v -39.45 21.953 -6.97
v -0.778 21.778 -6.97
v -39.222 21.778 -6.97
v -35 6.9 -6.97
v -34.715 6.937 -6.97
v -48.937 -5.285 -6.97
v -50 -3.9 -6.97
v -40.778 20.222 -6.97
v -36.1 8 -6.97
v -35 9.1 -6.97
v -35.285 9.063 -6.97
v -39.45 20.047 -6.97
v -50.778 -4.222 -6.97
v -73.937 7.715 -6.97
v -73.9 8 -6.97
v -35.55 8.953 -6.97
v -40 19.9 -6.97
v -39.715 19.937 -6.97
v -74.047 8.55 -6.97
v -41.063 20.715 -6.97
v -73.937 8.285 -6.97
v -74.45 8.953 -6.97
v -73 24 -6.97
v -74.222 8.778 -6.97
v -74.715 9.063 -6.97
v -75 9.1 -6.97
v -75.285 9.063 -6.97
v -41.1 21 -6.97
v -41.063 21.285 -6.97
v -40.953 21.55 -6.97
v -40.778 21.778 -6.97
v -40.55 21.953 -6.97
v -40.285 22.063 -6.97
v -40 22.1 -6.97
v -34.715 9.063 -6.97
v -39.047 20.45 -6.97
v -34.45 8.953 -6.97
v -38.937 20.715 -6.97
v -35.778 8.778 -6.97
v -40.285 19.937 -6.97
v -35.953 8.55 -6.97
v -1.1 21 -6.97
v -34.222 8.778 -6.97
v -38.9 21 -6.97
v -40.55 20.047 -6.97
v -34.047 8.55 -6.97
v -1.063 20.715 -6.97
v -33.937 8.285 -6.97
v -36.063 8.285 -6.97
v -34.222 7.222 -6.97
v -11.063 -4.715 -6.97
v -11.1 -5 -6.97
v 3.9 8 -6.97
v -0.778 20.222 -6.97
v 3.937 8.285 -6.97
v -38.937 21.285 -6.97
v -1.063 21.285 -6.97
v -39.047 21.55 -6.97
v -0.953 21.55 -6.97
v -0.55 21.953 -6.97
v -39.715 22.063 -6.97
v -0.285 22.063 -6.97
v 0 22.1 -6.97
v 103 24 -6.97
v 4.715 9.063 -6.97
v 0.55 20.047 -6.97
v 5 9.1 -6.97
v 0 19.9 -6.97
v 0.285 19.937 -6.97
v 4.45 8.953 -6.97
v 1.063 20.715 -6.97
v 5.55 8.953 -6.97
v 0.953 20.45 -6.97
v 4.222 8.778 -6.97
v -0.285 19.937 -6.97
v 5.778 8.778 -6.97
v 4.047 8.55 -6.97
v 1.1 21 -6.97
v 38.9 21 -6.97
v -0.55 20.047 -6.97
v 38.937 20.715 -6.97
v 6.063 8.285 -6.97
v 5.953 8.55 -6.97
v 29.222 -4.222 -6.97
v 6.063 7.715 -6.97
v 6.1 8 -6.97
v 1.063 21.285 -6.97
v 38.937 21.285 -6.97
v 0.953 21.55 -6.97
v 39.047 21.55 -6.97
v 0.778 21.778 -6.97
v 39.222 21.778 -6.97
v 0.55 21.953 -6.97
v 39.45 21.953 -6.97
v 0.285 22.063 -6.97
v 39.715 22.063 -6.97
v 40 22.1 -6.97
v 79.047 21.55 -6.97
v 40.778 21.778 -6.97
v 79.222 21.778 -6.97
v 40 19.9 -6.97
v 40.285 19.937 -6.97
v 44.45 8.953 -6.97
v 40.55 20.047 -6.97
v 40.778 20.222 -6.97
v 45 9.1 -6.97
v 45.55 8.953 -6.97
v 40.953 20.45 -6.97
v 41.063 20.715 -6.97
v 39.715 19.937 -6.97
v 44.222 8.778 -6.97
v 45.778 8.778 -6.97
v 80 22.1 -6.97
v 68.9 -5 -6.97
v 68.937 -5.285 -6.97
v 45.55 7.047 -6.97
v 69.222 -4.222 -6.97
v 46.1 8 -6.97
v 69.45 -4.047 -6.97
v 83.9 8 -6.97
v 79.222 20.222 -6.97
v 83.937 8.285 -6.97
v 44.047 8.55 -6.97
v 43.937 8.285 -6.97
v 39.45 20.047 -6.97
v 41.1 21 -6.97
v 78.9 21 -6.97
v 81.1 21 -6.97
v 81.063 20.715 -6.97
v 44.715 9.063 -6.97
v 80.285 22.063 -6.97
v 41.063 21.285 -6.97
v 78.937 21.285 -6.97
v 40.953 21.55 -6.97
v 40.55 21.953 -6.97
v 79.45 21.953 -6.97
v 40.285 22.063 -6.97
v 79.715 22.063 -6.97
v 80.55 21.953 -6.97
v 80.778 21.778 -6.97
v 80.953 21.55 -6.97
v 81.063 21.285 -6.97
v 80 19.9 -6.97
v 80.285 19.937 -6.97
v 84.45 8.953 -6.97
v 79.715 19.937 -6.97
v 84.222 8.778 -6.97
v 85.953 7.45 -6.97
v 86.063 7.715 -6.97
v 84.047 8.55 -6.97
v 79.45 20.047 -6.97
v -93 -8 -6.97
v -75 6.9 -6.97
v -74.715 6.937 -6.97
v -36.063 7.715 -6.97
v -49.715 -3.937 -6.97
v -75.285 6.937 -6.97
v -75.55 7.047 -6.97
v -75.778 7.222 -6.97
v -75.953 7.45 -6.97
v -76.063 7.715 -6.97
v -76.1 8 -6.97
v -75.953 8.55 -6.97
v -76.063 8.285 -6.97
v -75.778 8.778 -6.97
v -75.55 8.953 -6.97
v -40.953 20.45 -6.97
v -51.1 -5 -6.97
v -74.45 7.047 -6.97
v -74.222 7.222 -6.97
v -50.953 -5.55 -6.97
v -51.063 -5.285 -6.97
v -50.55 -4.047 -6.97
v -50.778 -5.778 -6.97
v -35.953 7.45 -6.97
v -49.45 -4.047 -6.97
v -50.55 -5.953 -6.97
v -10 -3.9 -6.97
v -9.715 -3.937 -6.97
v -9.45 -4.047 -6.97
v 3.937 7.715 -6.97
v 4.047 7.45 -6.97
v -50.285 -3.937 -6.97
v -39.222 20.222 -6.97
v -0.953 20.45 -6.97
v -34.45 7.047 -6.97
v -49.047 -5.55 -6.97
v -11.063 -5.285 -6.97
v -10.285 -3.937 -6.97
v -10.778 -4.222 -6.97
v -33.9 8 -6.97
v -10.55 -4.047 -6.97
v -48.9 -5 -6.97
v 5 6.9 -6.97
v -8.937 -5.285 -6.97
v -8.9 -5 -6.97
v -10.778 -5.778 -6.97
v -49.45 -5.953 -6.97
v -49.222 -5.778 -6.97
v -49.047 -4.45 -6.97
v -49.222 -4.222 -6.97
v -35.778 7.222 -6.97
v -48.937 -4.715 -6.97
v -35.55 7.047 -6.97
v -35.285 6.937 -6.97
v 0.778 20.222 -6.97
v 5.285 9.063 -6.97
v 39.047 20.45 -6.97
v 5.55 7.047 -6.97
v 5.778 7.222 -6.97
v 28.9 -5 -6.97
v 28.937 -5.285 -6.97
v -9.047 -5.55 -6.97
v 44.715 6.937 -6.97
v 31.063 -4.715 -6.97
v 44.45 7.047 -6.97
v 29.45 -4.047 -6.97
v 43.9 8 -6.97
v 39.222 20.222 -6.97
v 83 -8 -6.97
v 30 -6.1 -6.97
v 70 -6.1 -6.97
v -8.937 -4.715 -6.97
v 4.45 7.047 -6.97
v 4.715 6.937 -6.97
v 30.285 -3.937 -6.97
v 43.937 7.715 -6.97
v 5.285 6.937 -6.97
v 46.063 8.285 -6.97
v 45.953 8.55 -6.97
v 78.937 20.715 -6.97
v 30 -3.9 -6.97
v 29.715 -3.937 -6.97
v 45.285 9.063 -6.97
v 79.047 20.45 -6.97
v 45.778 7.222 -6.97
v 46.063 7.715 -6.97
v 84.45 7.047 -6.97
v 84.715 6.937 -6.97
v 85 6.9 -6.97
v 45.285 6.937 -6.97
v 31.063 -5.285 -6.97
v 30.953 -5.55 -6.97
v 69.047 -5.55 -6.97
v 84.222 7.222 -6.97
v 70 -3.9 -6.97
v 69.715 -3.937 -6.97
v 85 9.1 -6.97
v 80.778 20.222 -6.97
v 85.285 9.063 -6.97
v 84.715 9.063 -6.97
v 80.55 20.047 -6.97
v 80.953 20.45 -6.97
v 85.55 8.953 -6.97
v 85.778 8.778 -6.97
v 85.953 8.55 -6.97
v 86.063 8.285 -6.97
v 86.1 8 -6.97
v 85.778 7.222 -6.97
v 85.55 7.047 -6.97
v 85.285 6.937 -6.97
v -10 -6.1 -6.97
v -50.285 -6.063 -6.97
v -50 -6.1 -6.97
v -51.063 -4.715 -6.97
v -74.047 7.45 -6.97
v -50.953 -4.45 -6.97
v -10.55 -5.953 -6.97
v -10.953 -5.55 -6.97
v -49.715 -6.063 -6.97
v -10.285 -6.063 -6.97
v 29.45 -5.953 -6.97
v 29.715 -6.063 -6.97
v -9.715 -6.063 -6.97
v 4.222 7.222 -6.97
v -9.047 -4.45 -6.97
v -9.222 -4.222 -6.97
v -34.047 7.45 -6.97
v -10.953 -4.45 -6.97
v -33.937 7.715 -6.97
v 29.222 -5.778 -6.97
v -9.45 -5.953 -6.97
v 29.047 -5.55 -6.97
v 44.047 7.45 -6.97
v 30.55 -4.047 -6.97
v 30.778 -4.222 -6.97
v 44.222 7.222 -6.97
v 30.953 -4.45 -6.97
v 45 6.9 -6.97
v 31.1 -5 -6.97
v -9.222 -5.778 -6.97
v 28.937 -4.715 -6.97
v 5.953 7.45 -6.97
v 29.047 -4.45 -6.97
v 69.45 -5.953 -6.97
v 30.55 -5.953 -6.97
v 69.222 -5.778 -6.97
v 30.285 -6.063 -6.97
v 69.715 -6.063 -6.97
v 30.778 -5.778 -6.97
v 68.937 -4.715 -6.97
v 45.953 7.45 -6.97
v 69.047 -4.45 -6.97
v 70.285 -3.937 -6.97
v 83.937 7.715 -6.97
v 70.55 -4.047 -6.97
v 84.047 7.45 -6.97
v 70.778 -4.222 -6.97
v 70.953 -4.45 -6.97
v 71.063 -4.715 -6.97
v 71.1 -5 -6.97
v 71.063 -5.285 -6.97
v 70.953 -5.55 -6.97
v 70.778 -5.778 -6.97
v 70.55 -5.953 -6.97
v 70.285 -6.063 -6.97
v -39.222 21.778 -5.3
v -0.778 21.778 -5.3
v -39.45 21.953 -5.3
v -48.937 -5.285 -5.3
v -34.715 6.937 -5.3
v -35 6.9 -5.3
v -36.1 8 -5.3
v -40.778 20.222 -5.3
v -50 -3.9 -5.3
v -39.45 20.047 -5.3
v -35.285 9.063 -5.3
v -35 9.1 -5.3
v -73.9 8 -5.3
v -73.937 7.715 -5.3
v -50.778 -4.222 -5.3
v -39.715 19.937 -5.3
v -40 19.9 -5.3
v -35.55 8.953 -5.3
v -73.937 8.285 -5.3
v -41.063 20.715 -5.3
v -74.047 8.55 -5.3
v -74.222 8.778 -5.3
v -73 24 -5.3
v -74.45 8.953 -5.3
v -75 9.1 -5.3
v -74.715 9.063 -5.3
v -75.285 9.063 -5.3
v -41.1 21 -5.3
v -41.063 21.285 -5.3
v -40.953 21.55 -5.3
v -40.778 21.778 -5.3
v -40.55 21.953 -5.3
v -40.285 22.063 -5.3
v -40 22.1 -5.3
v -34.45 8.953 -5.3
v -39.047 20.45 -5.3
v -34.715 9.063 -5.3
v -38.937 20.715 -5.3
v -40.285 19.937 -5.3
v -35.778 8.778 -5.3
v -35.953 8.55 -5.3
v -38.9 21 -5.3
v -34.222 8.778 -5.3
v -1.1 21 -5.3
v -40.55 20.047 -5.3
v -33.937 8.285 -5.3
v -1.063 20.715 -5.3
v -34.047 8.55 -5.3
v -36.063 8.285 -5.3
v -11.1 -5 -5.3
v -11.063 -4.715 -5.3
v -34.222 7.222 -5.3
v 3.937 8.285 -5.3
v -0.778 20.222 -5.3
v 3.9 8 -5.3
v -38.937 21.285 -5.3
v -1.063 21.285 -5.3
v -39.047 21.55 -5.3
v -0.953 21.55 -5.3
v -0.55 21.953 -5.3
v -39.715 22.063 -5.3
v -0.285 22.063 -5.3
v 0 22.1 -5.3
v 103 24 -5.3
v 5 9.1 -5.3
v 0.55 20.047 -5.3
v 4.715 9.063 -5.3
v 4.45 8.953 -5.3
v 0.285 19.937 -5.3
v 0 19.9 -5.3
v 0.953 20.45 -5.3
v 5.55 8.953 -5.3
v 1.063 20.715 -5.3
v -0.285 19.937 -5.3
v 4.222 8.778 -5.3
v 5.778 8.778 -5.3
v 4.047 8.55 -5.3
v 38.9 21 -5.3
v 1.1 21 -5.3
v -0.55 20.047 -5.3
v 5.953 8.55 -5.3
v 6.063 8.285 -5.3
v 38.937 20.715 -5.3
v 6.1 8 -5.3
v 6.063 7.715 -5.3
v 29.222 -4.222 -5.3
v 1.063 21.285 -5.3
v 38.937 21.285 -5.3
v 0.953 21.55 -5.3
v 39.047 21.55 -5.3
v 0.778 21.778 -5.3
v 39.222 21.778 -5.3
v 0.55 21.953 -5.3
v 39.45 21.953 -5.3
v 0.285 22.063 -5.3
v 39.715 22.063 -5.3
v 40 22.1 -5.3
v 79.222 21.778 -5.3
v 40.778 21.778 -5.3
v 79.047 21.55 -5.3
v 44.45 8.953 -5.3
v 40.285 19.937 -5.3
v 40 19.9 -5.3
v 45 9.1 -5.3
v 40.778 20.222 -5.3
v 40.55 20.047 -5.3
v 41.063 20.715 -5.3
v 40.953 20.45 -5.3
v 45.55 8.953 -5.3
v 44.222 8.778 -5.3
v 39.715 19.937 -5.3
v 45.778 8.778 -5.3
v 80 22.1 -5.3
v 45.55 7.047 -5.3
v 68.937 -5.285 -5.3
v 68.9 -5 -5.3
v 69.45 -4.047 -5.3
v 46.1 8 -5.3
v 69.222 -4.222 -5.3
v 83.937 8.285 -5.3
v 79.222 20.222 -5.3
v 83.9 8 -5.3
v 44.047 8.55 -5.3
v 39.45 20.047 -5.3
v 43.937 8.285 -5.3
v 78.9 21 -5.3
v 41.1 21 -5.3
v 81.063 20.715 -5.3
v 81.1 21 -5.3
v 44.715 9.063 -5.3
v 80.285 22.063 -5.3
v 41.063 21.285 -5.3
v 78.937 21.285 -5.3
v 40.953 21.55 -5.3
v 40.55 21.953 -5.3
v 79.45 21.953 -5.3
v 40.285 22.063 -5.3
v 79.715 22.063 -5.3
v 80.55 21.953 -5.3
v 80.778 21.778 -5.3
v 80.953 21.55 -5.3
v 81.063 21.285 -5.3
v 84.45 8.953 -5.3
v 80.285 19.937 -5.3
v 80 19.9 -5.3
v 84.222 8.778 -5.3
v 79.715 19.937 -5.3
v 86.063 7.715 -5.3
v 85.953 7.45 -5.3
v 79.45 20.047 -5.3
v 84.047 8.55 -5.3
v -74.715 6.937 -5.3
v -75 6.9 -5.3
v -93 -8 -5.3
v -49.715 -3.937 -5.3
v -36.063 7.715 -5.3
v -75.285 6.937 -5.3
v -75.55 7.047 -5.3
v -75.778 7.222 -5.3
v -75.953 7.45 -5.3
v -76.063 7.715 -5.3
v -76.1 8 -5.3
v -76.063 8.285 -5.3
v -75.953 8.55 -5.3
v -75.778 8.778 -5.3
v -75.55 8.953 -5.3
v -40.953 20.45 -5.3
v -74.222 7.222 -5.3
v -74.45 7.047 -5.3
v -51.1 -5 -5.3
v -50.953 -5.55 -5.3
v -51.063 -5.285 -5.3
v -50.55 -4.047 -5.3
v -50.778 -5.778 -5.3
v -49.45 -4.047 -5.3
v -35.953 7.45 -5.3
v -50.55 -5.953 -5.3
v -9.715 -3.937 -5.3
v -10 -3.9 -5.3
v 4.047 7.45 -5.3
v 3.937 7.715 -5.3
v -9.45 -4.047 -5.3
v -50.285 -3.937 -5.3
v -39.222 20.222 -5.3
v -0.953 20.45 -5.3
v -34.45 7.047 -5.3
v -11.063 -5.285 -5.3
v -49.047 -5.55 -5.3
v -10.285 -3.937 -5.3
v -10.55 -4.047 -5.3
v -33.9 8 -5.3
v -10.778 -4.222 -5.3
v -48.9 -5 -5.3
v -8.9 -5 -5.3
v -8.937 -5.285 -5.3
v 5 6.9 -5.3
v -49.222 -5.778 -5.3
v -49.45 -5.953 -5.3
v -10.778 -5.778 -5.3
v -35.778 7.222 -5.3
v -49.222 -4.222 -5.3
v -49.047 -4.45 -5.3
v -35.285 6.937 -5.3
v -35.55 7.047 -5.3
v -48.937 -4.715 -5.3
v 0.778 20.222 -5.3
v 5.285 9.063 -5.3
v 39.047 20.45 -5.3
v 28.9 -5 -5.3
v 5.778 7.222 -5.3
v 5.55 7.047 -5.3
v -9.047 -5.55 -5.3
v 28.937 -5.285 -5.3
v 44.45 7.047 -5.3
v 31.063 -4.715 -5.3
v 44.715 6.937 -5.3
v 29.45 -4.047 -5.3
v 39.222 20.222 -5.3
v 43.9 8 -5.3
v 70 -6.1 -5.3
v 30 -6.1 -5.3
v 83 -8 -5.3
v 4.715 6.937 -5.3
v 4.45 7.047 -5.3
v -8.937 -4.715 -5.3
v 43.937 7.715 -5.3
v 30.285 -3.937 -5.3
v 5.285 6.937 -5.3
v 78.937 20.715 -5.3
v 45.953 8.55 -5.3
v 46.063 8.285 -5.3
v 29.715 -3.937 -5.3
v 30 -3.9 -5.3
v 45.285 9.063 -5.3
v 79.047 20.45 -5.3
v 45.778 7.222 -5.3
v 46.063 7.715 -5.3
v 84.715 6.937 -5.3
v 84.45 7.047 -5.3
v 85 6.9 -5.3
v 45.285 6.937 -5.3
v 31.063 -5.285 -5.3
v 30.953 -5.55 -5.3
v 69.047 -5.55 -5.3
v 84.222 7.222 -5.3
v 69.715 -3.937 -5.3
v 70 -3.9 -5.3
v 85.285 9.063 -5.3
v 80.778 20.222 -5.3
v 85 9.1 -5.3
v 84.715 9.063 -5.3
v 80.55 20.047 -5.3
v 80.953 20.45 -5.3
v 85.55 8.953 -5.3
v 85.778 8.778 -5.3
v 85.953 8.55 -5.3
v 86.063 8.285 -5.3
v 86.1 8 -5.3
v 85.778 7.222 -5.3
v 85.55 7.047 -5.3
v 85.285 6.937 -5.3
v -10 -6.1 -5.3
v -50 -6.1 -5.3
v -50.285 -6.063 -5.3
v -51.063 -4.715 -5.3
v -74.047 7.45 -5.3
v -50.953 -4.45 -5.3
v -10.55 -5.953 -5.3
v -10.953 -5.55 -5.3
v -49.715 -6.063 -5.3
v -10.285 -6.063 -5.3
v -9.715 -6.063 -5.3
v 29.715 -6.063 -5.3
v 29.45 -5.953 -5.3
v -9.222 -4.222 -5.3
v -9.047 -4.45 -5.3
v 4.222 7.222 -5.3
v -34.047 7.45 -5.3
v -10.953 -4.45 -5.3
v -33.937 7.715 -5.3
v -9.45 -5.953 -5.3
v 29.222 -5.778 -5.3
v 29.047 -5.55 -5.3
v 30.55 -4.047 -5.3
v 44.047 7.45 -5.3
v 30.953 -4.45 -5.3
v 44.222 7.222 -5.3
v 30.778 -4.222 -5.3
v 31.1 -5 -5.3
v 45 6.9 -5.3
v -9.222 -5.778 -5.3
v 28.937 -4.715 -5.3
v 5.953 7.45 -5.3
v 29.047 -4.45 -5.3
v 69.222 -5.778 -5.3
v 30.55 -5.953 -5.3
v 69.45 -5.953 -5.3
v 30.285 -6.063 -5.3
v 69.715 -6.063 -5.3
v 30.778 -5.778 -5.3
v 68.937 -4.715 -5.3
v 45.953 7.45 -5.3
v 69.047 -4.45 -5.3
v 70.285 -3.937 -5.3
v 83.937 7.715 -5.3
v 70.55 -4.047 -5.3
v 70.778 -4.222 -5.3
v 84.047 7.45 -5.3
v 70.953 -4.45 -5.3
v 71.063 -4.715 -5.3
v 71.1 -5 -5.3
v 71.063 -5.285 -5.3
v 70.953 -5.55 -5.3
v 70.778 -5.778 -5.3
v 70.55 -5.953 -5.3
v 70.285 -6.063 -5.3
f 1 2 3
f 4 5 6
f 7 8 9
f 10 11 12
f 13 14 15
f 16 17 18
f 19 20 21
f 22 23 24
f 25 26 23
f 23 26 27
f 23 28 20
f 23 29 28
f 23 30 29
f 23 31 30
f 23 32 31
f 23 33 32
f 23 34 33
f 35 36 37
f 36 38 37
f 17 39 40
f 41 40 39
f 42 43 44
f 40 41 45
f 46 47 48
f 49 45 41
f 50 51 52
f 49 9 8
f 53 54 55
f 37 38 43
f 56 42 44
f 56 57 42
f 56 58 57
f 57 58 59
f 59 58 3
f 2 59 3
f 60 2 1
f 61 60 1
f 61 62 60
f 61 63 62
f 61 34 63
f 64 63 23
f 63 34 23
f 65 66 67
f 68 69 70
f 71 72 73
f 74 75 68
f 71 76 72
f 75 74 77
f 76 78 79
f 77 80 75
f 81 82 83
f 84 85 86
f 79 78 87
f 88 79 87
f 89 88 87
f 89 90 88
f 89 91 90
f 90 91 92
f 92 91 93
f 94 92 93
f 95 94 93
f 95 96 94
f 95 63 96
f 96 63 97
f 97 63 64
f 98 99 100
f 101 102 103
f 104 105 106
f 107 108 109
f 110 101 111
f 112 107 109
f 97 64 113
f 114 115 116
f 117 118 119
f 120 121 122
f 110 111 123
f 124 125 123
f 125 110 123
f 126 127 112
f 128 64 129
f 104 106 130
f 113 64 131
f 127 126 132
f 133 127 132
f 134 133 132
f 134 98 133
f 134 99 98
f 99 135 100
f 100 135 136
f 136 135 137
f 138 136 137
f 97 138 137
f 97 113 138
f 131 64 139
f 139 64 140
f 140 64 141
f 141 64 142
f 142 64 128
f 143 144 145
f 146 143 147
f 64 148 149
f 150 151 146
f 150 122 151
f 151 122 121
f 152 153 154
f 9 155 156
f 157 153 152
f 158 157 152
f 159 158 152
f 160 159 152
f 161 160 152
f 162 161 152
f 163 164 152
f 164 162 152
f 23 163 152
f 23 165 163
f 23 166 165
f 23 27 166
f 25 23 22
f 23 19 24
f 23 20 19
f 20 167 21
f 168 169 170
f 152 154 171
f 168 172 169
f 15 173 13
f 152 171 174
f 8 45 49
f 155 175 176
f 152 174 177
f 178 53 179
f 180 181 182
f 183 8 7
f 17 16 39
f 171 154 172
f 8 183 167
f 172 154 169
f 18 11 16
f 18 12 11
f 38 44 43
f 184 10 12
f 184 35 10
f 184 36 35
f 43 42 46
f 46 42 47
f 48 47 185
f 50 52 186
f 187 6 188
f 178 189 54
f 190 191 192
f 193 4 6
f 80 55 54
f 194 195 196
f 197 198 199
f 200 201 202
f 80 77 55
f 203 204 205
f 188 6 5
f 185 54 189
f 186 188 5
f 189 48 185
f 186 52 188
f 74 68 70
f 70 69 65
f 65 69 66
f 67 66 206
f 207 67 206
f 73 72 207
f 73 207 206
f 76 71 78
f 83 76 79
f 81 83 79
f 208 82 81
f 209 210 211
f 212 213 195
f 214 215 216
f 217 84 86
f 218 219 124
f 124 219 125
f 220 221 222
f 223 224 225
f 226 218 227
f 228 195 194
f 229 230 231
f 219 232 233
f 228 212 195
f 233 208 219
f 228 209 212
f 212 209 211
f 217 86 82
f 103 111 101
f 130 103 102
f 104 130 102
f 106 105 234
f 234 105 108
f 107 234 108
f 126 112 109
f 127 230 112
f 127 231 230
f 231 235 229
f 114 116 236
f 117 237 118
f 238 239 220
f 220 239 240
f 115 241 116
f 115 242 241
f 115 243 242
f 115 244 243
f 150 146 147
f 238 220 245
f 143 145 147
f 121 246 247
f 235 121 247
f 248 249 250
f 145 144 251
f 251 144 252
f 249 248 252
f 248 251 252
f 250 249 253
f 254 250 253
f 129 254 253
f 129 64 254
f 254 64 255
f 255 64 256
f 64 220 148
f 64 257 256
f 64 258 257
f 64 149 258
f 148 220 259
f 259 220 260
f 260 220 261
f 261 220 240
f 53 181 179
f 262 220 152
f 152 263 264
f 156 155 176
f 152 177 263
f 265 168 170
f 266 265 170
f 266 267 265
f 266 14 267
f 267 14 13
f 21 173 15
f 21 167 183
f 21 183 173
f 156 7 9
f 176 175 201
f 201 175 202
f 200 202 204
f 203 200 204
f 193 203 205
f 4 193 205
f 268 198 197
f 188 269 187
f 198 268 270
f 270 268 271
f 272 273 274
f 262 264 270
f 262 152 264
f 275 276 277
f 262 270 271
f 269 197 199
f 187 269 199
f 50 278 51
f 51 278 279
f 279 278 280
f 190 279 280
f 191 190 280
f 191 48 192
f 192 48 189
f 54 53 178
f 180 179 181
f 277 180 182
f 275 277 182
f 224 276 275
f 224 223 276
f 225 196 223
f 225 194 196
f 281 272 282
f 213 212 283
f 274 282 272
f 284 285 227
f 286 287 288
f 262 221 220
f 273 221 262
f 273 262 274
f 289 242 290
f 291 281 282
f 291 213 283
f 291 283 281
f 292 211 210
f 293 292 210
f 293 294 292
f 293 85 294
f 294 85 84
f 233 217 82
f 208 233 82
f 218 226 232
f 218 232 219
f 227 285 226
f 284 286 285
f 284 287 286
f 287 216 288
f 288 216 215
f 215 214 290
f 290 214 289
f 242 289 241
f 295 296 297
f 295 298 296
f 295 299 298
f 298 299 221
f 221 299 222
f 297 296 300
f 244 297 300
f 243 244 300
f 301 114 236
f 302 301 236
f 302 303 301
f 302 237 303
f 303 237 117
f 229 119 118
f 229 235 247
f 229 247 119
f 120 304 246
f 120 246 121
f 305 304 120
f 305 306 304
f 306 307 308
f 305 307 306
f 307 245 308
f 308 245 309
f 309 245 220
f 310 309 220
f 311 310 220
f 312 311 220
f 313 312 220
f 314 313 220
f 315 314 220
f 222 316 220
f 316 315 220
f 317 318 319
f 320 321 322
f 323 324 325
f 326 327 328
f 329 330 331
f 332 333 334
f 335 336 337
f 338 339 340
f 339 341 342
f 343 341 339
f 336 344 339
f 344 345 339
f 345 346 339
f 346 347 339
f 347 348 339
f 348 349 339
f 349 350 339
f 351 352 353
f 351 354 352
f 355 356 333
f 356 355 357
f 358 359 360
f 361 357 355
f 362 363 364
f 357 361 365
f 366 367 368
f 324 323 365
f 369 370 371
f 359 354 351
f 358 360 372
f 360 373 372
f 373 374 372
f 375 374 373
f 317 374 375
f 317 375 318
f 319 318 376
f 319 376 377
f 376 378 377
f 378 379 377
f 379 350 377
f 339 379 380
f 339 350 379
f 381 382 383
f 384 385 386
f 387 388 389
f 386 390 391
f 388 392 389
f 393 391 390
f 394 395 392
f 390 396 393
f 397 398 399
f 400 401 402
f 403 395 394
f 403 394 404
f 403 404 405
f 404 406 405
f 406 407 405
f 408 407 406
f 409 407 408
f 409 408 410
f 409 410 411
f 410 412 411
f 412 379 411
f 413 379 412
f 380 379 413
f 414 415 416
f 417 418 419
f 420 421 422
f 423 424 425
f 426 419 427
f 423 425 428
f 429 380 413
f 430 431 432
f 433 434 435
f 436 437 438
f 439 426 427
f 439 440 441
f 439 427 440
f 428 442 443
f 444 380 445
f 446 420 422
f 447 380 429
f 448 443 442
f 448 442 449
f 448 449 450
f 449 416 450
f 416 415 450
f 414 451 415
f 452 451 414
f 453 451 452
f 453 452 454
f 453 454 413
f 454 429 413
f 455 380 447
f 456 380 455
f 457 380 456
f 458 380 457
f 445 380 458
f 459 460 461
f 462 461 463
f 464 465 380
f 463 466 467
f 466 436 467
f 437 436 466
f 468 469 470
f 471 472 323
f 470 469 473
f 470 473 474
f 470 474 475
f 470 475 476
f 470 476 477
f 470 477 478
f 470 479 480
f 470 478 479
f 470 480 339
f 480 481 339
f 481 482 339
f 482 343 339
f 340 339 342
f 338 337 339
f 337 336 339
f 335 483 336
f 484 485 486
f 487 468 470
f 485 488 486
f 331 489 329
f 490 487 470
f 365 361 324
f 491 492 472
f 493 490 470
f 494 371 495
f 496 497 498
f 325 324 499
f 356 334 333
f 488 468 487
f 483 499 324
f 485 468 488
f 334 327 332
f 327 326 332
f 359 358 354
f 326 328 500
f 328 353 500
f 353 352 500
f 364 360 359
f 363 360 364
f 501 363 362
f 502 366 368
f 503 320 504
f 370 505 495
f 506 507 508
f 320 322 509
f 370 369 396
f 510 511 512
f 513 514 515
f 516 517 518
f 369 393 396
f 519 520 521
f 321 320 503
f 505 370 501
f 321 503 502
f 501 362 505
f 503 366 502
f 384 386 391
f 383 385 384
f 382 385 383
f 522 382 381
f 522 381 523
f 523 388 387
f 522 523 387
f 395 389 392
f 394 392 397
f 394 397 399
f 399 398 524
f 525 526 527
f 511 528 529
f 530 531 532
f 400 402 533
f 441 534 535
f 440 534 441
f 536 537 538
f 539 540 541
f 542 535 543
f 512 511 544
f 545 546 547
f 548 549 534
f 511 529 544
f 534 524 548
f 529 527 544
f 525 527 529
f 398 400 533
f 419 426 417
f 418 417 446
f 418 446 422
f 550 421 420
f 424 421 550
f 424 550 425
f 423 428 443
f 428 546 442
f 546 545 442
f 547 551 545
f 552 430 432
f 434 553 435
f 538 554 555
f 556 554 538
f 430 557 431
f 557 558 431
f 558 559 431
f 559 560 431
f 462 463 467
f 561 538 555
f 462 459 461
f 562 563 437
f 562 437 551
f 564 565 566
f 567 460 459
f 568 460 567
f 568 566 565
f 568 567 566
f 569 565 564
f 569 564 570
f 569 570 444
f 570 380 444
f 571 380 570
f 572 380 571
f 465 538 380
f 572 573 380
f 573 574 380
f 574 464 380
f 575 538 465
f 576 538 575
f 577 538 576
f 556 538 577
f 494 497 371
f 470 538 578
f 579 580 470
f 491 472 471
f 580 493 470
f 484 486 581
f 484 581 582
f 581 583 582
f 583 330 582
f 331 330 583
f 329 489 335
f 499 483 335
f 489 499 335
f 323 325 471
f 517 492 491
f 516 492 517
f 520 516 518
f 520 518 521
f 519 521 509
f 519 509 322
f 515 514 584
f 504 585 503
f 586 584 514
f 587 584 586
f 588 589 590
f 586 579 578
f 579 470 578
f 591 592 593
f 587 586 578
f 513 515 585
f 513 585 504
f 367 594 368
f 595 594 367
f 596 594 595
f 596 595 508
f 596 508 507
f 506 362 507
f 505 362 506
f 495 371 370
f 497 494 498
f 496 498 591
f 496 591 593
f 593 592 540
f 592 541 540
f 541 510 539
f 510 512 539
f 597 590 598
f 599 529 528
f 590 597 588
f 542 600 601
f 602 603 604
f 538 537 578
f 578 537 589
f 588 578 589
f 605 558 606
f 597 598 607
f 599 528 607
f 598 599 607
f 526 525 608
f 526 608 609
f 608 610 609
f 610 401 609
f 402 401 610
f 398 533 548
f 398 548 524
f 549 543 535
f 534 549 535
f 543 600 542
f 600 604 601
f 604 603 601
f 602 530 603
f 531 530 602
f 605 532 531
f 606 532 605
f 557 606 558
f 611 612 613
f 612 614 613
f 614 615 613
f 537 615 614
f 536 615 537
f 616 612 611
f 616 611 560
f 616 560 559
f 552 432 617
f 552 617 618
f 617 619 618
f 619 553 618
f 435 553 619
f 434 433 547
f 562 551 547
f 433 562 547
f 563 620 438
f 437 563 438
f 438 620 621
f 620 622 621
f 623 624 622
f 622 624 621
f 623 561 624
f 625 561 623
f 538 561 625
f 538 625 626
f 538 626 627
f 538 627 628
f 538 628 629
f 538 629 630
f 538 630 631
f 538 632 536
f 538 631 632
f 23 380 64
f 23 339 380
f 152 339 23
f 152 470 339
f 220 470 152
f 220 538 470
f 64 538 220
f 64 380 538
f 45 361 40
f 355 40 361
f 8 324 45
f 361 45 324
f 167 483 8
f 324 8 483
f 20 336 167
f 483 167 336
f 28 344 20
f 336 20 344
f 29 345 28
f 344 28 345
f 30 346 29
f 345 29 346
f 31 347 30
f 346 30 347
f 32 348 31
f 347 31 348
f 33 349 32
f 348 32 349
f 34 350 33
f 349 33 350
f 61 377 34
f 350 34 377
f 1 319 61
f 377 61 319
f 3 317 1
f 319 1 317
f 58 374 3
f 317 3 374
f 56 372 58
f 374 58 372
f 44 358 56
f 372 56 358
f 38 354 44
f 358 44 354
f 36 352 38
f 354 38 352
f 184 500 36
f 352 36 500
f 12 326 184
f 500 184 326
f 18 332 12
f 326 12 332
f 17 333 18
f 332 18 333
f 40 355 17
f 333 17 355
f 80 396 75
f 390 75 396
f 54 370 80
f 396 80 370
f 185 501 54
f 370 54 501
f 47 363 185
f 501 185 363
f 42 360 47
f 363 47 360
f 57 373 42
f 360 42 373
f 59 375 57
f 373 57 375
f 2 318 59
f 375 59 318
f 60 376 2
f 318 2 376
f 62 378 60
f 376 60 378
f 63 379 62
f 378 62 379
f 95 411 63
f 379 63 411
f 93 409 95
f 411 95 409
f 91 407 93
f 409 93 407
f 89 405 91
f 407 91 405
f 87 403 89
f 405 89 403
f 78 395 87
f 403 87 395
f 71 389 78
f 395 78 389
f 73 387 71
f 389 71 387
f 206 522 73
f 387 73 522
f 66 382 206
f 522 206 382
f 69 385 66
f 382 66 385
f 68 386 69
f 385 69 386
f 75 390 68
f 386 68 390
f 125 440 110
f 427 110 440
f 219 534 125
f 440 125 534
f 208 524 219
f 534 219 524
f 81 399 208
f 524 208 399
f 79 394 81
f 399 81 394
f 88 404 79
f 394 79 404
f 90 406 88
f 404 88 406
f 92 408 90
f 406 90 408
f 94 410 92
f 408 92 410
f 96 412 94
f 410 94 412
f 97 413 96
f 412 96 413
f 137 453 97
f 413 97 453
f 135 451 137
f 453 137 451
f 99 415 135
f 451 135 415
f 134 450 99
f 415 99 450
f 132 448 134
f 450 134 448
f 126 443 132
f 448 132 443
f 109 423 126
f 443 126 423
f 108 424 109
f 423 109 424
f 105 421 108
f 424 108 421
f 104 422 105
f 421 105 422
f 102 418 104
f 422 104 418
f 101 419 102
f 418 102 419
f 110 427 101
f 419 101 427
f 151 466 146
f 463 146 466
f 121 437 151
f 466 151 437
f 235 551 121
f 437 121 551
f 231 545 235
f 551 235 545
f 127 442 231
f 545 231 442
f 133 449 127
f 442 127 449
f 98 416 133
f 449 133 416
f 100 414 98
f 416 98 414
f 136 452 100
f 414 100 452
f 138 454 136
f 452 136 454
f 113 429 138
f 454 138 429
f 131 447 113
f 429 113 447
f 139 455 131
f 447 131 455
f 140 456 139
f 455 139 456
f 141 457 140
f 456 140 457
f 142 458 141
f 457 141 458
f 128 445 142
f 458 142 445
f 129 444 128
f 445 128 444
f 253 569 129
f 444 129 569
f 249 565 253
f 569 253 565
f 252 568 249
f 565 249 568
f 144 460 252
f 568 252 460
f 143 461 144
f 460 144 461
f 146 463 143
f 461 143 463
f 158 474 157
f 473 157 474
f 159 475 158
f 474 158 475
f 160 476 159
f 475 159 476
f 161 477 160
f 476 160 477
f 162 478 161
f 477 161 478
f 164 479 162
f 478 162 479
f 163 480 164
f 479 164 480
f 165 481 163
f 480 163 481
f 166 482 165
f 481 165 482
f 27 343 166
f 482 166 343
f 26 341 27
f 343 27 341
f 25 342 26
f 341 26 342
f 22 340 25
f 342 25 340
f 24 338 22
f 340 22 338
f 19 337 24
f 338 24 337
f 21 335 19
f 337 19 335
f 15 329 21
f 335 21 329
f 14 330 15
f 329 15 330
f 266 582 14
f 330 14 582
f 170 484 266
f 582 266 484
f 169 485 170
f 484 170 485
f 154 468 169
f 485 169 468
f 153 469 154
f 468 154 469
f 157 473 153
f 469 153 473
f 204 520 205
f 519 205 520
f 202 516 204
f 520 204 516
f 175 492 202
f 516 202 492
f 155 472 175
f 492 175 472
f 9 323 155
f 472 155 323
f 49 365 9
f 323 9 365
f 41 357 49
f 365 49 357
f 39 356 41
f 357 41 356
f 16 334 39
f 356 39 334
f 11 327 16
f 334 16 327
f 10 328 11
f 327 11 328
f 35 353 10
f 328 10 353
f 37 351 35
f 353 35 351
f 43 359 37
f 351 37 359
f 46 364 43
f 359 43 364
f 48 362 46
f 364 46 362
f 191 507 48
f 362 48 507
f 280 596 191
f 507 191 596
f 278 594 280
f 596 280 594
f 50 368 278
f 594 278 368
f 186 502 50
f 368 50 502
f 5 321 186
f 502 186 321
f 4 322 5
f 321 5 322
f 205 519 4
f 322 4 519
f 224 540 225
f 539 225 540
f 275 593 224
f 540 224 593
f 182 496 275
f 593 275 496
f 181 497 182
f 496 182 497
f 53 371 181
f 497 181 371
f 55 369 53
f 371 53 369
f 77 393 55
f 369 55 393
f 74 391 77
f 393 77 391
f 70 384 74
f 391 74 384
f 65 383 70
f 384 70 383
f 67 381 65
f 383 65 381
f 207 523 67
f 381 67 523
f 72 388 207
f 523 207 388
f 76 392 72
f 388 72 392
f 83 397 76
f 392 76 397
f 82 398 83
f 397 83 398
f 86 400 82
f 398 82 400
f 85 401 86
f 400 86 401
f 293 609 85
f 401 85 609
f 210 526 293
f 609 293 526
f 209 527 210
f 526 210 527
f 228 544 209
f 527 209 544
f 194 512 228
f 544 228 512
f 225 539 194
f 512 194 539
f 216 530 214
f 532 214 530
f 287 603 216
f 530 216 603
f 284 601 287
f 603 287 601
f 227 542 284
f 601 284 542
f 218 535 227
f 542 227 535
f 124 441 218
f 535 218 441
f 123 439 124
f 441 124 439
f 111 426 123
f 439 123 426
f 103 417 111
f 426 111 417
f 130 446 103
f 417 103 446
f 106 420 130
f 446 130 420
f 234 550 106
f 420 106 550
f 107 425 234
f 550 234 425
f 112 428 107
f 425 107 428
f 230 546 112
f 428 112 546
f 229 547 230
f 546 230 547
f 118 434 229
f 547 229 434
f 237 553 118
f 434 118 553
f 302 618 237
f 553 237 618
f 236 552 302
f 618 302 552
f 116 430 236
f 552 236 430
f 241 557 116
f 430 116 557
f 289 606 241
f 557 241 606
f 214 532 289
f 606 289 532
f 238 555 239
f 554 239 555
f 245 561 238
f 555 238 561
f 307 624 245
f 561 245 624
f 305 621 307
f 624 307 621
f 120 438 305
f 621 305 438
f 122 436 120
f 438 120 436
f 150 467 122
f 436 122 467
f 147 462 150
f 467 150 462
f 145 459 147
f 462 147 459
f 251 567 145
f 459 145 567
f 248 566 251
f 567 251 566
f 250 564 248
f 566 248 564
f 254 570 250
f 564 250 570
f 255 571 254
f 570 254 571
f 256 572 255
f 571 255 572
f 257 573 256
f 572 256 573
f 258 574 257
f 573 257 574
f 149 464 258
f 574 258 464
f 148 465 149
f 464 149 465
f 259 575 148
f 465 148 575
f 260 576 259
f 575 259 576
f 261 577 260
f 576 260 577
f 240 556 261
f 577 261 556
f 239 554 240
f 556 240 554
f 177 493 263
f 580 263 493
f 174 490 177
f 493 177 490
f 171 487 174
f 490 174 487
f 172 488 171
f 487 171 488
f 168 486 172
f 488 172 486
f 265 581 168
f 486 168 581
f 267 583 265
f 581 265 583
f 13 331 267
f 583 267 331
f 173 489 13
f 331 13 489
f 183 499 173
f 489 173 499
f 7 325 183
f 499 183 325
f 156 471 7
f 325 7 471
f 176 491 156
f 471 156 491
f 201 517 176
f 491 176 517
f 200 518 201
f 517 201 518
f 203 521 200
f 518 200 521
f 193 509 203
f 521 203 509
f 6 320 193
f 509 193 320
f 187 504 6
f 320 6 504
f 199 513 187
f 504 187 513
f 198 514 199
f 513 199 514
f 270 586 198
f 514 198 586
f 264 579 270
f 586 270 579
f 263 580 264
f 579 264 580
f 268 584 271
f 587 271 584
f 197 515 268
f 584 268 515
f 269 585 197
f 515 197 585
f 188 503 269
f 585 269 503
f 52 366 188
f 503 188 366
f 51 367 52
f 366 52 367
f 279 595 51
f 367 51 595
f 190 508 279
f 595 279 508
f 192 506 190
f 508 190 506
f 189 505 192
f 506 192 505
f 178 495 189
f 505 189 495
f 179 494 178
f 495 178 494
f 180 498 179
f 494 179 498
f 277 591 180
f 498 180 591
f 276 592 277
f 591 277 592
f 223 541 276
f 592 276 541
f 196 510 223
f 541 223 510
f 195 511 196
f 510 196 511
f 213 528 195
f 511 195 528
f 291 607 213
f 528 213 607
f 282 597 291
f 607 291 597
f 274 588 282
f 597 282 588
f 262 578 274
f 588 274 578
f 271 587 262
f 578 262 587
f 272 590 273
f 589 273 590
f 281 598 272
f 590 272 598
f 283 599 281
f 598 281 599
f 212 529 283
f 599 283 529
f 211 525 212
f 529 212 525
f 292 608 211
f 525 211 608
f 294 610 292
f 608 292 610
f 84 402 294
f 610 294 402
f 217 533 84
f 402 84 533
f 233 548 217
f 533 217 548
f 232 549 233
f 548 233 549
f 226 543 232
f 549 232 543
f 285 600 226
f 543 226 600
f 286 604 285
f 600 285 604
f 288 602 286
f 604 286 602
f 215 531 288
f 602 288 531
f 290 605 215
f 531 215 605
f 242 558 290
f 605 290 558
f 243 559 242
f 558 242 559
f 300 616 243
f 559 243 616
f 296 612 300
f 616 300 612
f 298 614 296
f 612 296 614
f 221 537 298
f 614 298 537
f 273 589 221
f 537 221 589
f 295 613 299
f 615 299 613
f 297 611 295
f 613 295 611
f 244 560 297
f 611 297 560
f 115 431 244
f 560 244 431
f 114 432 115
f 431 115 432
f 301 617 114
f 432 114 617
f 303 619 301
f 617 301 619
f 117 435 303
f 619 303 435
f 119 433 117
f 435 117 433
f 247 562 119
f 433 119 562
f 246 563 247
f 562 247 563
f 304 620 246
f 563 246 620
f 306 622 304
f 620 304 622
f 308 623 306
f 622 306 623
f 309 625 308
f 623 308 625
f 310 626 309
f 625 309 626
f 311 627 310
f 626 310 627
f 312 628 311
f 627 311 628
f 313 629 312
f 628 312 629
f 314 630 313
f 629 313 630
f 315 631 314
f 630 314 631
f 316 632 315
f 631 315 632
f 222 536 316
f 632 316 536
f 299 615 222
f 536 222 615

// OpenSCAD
// file: ../hall_pcb/bass/board.scad
// Bass Hall-sensor board: generated by ../export_scad.py from bass.kicad_pcb; do not edit
// board frame: X, Y in the board's plane, W out of its top face; parts hang below -hall_t
hall_t = 1.67;   // laminate and both coppers
hall_tilt = atan(0.0);   // against each row's horizontal
hall_outline = [[-93.0, -8], [83.0, -8], [103.0, 24.0], [-73.0, 24.0]];
hall_holes = [[-50, -5.0], [-10, -5.0], [30, -5.0], [70, -5.0], [-75, 8.0], [-35, 8.0], [5, 8.0], [45, 8.0], [85, 8.0], [-40, 21.0], [0, 21.0], [40, 21.0], [80, 21.0]];
hall_hole_d = 2.2;
hall_keys = [[0, 1, -80, 0.0], [0, 2, -60, 0.0], [0, 3, -40, 0.0], [0, 4, -20, 0.0], [0, 5, 0, 0.0], [0, 6, 20, 0.0], [0, 7, 40, 0.0], [0, 8, 60, 0.0], [0, 9, 80, 0.0], [1, 1, -70, 16.0], [1, 2, -50, 16.0], [1, 3, -30, 16.0], [1, 4, -10, 16.0], [1, 5, 10, 16.0], [1, 6, 30, 16.0], [1, 7, 50, 16.0], [1, 8, 70, 16.0], [1, 9, 90, 16.0]];   // row, key, X, Y
hall_sens_dy = 0.0;
// [ref, side, X0, Y0, X1, Y1, height]
hall_parts = [
  ["C1", "B", -63.025, 6.255, -60.975, 9.745, 1.35],
  ["C101", "B", -77.805, -0.955, -76.795, 0.955, 0.55],
  ["C102", "B", -57.805, -0.955, -56.795, 0.955, 0.55],
  ["C103", "B", -37.805, -0.955, -36.795, 0.955, 0.55],
  ["C104", "B", -17.805, -0.955, -16.795, 0.955, 0.55],
  ["C105", "B", 2.195, -0.955, 3.205, 0.955, 0.55],
  ["C106", "B", 22.195, -0.955, 23.205, 0.955, 0.55],
  ["C107", "B", 42.195, -0.955, 43.205, 0.955, 0.55],
  ["C108", "B", 62.195, -0.955, 63.205, 0.955, 0.55],
  ["C109", "B", 82.195, -0.955, 83.205, 0.955, 0.55],
  ["C11", "B", -54.855, 10.545, -53.845, 12.455, 0.55],
  ["C110", "B", -67.805, 15.045, -66.795, 16.955, 0.55],
  ["C111", "B", -47.805, 15.045, -46.795, 16.955, 0.55],
  ["C112", "B", -27.805, 15.045, -26.795, 16.955, 0.55],
  ["C113", "B", -7.805, 15.045, -6.795, 16.955, 0.55],
  ["C114", "B", 12.195, 15.045, 13.205, 16.955, 0.55],
  ["C115", "B", 32.195, 15.045, 33.205, 16.955, 0.55],
  ["C116", "B", 52.195, 15.045, 53.205, 16.955, 0.55],
  ["C117", "B", 72.195, 15.045, 73.205, 16.955, 0.55],
  ["C118", "B", 92.195, 15.045, 93.205, 16.955, 0.55],
  ["C12", "B", -53.555, 10.545, -52.545, 12.455, 0.55],
  ["C13", "B", -52.455, 8.145, -50.545, 9.155, 0.55],
  ["C21", "B", -14.855, 10.545, -13.845, 12.455, 0.55],
  ["C22", "B", -13.555, 10.545, -12.545, 12.455, 0.55],
  ["C23", "B", -12.455, 8.145, -10.545, 9.155, 0.55],
  ["C31", "B", 65.145, 10.545, 66.155, 12.455, 0.55],
  ["C32", "B", 66.445, 10.545, 67.455, 12.455, 0.55],
  ["C33", "B", 67.545, 8.145, 69.455, 9.155, 0.55],
  ["J1", "B", -74.445, -7.145, -65.555, -1.855, 4.25],
  ["R11", "B", -66.975, 6.185, -65.025, 7.215, 0.55],
  ["R12", "B", -66.975, 7.485, -65.025, 8.515, 0.55],
  ["R13", "B", -66.975, 8.785, -65.025, 9.815, 0.55],
  ["R2", "B", -12.475, 6.835, -10.525, 7.865, 0.55],
  ["R3", "B", 67.525, 6.835, 69.475, 7.865, 0.55],
  ["U1", "B", -57.175, 5.825, -52.825, 10.175, 0.8],
  ["U101", "B", -81.975, -1.745, -78.025, 1.745, 1.12],
  ["U102", "B", -61.975, -1.745, -58.025, 1.745, 1.12],
  ["U103", "B", -41.975, -1.745, -38.025, 1.745, 1.12],
  ["U104", "B", -21.975, -1.745, -18.025, 1.745, 1.12],
  ["U105", "B", -1.975, -1.745, 1.975, 1.745, 1.12],
  ["U106", "B", 18.025, -1.745, 21.975, 1.745, 1.12],
  ["U107", "B", 38.025, -1.745, 41.975, 1.745, 1.12],
  ["U108", "B", 58.025, -1.745, 61.975, 1.745, 1.12],
  ["U109", "B", 78.025, -1.745, 81.975, 1.745, 1.12],
  ["U110", "B", -71.975, 14.255, -68.025, 17.745, 1.12],
  ["U111", "B", -51.975, 14.255, -48.025, 17.745, 1.12],
  ["U112", "B", -31.975, 14.255, -28.025, 17.745, 1.12],
  ["U113", "B", -11.975, 14.255, -8.025, 17.745, 1.12],
  ["U114", "B", 8.025, 14.255, 11.975, 17.745, 1.12],
  ["U115", "B", 28.025, 14.255, 31.975, 17.745, 1.12],
  ["U116", "B", 48.025, 14.255, 51.975, 17.745, 1.12],
  ["U117", "B", 68.025, 14.255, 71.975, 17.745, 1.12],
  ["U118", "B", 88.025, 14.255, 91.975, 17.745, 1.12],
  ["U2", "B", -17.175, 5.825, -12.825, 10.175, 0.8],
  ["U3", "B", 62.825, 5.825, 67.175, 10.175, 0.8]
];
hall_conn = [-70.0, -4.5];   // J1: the pins' middle (X), its centre (Y)
hall_conn_side = false;   // side entry, opening to +Y
hall_conn_front = -5.0;   // its opening (Y)
// file: layout.scad
// Bass: what all the bass's parts share. Taken from the example (ref/: the earlier
// BassCase) [given]: only the key arrangement and the hand plate's flat middle part.
//
// Frame: x along the rows, y from the hand plate towards the back, z up.

// --- keys: the example's arrangement
pitch    = 20;
rows_y   = [0, 16];              // front, back
rows_x0  = [-80, -70];           // first key of each row; 9 per row [given: 2 x 9]: the
n_row    = 9;                    //   example's 8 + 8, its half-closed front-left well and an added x = 90
cap_top  = [11, 21];             // cap tops at rest: the example's short and tall keys

// --- the keys: ../switch_hall/ (Hall sensor, spring under the cap) [given 2026-11-13], on
// one Hall-sensor board under both rows (../hall_pcb/bass/), lying flat (key.scad with
// board_tilt = 0). The back row's spring seat, tube top and all above it stand
// key_riser higher (key.scad riser), so its caps reach the example's 21 with the same
// board; collar, magnet and sensor keep their place at the board.
key_top   = 17.135;              // key.scad, board_tilt = 0: cap top over the board's middle (with the 4 mm bronze bushing)
key_riser = 10;
assert(abs(cap_top[1] - cap_top[0] - key_riser) < 1e-6, "the back row's riser must match the caps");
cover_t  = 1.2;
pcb_t    = 1.6;
cu_t     = 0.035;
stroke   = 3;
board_mid = cap_top[0] - key_top;               // -3.635: the board's middle plane
board_top = board_mid + pcb_t / 2 + cu_t;        // -2.8
board_bot = board_mid - pcb_t / 2 - cu_t;
board_z  = [board_mid, board_mid];               // per row, for code that indexes rows
cover_top = [board_top + cover_t, board_top + cover_t + key_riser];   // front slab, back step

// --- the hand plate: the example's flat middle part, half as wide [given], 131.5 x 128.3;
// its top flush with the front cover [given 2026-11-14: no raised edge over the cover],
// which lies 6.6 lower against the caps than before, since the new keys stand taller
plate_w  = 263 / 2;
plate_y  = [-12.5, -9.5];        // the front wall, 3 thick; the hand presses on y = -12.5
plate_top0 = 5.035;              // the old front cover's top: the plate's height and the old bottom follow from it
plate_h  = 0.75 * (166 + plate_top0);   // the example's height (z -166 to the front cover) less 25 % [given]
plate_z  = [cover_top[0] - plate_h, cover_top[0]];
plate_rise = plate_z[1] - cover_top[0];   // 0

gap      = 0.1;                  // housing to the boards' undersides
fit      = 0.3;

// --- the board: ../hall_pcb/bass/ (its data from the routed KiCad board): board frame
// X = x, Y = y, its middle at board_mid; the tray round it as the discant's (part_gap
// under the tallest part but the plug, case_fit and a case_wall rim)
include <../hall_pcb/bass/board.scad>
case_fit   = 0.3;
case_wall  = 1.2;
case_rim   = case_fit + case_wall;
part_gap   = 0.3;
case_floor = 1.2;
h_max  = max([for (q = hall_parts) if (q[0] != "J1") q[6]]);
w_ft   = board_bot - h_max - part_gap;          // the tray's floor, top (z)
z_floor = w_ft - case_floor;                    // the deck's underside
hx = [for (q = hall_outline) q[0]];
hy = [for (q = hall_outline) q[1]];

// --- the deck and the box below it: one rectangular block [given 2026-11-14: a
// rectangular footprint; stored, not all of the discant's keys need be covered], as
// narrow as the strap allows: its outer slots end 100 from the middle, 1.5 inside the
// front face's rounded edge (case.scad), so 211 wide; the board (with its rim) is
// narrower and lies in the middle
end_wall = 1.2;
deck_core = [min(hx) - case_rim, max(hx) + case_rim];   // the board and its rim
x_mid    = (deck_core[0] + deck_core[1]) / 2;
box_w    = max(deck_core[1] - deck_core[0], 2 * (100 + 1.5 + 4));
deck_x   = [x_mid - box_w / 2, x_mid + box_w / 2];
// the box, hand plate, strap and mount are centred on the deck; what was placed by hand
// on the old deck's middle (x -1.75, two sawn boards with their connector ends) moves
// with it by ex
ex       = x_mid + 1.75;
plate_x  = [(deck_x[0] + deck_x[1]) / 2 - plate_w / 2, (deck_x[0] + deck_x[1]) / 2 + plate_w / 2];   // centred on the deck
box_x    = deck_x;                    // straight sides, flush with the deck's ends
bottom_x = box_x;
function box_x_at(z) = box_x;
// THE BOX'S LENGTH, from the stored discant (link.scad: to_store()) [2026-11-14: the thin
// discant]: its short socket hangs right under the deck (its top store_socket_top over
// to_store()'s origin, measured from the build); the discant below it, and under its
// lowest point over the playing mount (store_front_d: the thumb bar, whole [given
// 2026-11-14: never cut, the bass is longer instead]) the travel to slide it on and off
// plus 0.3 over the mount's holders (hold_lo + hold_hi), which sit at the box's bottom.
// That fixes the bottom: 14.1 below the hand plate (it was 7.6 with the old discant, whose
// thick deck took the socket and whose bar was cut back over the mount). As link.scad:
// hold_lo, hold_hi, travel, front_d.
store_socket_top = 90.69;
store_front_d    = -16.47;
store_z  = z_floor + 0.5 - store_socket_top;             // to_store()'s z: the socket 0.5 into the deck's floor, one body with it
z_bot    = store_z - (5.9 + 6.89 + 0.3 + (8.3 + 1) - store_front_d);
box_ext  = plate_z[0] - z_bot;
assert(box_ext >= 2, "the box's bottom must stay under the hand plate");
// what was placed by hand in the box's lower part on the old bottom (z -130.84) moves with it
ez       = z_bot - (plate_top0 - 0.75 * (166 + plate_top0) - 7.6);
// below the deck the box is thin [given: thinner, gauges in the step behind it]: from the
// hand's face to box_back; the deck above keeps its full depth, and behind the box,
// under the deck, is the step where the gauges sit. 11.2 [given: 4.8 thinner, so that
// the stored discant comes 4.8 closer]: front wall 3, a 6 mm battery with 0.3 each side,
// back wall back_t
box_depth = 11.2;
box_back  = plate_y[0] + box_depth;
back_t    = 1.6;
// to the back: 0.9 of wall behind the back board's tab; the stored discant's gauge pocket
// (link.scad) reaches y 24.65, 3.2 inside
// to the back: the board's rim, or the stored discant's socket under the deck (link.scad,
// its holders' walls reach y 25.89), whichever is further: nothing stands out behind the cover
deck_y   = [plate_y[1], max(max(hy) + case_rim, 25.9)];
riser_y  = 9.8;                  // front of the back step: 2.3 clear of the front caps [given: >= 2]
step_wall = 1.2;                 // the cover's wall up the step, one piece with both slabs [given]
step_y   = riser_y + step_wall;  // where the back block begins
assert(min(hy) - case_rim >= plate_y[1] - 0.01, "the board's rim runs into the front wall");

function key_xy(k, i) = [rows_x0[k] + i * pitch, rows_y[k]];
function at_key(k, i) = [key_xy(k, i)[0], key_xy(k, i)[1], board_mid];   // key k, i's frame (key.scad)
module board2d(g = 0) offset(delta = g) polygon(hall_outline);
// main file
// The Hall-sensor board (../hall_pcb/bass/) in the case's frame: part = "boards" the
// laminate with its holes, "connectors" the parts' bodies on its underside (boxes from
// the KiCad board).
//
// make builds   openscad -o ../build/bass/boards.stl array.scad
include <layout.scad>
part = "boards";
if (part == "boards") translate([0, 0, board_bot]) linear_extrude(board_top - board_bot) difference() {
    board2d();
    for (h = hall_holes) translate(h) circle(d = hall_hole_d, $fn = 24);
}
if (part == "connectors") for (q = hall_parts) if (q[1] == "B")
    translate([q[2], q[3], board_bot - q[6]]) cube([q[4] - q[2], q[5] - q[3], q[6]]);
